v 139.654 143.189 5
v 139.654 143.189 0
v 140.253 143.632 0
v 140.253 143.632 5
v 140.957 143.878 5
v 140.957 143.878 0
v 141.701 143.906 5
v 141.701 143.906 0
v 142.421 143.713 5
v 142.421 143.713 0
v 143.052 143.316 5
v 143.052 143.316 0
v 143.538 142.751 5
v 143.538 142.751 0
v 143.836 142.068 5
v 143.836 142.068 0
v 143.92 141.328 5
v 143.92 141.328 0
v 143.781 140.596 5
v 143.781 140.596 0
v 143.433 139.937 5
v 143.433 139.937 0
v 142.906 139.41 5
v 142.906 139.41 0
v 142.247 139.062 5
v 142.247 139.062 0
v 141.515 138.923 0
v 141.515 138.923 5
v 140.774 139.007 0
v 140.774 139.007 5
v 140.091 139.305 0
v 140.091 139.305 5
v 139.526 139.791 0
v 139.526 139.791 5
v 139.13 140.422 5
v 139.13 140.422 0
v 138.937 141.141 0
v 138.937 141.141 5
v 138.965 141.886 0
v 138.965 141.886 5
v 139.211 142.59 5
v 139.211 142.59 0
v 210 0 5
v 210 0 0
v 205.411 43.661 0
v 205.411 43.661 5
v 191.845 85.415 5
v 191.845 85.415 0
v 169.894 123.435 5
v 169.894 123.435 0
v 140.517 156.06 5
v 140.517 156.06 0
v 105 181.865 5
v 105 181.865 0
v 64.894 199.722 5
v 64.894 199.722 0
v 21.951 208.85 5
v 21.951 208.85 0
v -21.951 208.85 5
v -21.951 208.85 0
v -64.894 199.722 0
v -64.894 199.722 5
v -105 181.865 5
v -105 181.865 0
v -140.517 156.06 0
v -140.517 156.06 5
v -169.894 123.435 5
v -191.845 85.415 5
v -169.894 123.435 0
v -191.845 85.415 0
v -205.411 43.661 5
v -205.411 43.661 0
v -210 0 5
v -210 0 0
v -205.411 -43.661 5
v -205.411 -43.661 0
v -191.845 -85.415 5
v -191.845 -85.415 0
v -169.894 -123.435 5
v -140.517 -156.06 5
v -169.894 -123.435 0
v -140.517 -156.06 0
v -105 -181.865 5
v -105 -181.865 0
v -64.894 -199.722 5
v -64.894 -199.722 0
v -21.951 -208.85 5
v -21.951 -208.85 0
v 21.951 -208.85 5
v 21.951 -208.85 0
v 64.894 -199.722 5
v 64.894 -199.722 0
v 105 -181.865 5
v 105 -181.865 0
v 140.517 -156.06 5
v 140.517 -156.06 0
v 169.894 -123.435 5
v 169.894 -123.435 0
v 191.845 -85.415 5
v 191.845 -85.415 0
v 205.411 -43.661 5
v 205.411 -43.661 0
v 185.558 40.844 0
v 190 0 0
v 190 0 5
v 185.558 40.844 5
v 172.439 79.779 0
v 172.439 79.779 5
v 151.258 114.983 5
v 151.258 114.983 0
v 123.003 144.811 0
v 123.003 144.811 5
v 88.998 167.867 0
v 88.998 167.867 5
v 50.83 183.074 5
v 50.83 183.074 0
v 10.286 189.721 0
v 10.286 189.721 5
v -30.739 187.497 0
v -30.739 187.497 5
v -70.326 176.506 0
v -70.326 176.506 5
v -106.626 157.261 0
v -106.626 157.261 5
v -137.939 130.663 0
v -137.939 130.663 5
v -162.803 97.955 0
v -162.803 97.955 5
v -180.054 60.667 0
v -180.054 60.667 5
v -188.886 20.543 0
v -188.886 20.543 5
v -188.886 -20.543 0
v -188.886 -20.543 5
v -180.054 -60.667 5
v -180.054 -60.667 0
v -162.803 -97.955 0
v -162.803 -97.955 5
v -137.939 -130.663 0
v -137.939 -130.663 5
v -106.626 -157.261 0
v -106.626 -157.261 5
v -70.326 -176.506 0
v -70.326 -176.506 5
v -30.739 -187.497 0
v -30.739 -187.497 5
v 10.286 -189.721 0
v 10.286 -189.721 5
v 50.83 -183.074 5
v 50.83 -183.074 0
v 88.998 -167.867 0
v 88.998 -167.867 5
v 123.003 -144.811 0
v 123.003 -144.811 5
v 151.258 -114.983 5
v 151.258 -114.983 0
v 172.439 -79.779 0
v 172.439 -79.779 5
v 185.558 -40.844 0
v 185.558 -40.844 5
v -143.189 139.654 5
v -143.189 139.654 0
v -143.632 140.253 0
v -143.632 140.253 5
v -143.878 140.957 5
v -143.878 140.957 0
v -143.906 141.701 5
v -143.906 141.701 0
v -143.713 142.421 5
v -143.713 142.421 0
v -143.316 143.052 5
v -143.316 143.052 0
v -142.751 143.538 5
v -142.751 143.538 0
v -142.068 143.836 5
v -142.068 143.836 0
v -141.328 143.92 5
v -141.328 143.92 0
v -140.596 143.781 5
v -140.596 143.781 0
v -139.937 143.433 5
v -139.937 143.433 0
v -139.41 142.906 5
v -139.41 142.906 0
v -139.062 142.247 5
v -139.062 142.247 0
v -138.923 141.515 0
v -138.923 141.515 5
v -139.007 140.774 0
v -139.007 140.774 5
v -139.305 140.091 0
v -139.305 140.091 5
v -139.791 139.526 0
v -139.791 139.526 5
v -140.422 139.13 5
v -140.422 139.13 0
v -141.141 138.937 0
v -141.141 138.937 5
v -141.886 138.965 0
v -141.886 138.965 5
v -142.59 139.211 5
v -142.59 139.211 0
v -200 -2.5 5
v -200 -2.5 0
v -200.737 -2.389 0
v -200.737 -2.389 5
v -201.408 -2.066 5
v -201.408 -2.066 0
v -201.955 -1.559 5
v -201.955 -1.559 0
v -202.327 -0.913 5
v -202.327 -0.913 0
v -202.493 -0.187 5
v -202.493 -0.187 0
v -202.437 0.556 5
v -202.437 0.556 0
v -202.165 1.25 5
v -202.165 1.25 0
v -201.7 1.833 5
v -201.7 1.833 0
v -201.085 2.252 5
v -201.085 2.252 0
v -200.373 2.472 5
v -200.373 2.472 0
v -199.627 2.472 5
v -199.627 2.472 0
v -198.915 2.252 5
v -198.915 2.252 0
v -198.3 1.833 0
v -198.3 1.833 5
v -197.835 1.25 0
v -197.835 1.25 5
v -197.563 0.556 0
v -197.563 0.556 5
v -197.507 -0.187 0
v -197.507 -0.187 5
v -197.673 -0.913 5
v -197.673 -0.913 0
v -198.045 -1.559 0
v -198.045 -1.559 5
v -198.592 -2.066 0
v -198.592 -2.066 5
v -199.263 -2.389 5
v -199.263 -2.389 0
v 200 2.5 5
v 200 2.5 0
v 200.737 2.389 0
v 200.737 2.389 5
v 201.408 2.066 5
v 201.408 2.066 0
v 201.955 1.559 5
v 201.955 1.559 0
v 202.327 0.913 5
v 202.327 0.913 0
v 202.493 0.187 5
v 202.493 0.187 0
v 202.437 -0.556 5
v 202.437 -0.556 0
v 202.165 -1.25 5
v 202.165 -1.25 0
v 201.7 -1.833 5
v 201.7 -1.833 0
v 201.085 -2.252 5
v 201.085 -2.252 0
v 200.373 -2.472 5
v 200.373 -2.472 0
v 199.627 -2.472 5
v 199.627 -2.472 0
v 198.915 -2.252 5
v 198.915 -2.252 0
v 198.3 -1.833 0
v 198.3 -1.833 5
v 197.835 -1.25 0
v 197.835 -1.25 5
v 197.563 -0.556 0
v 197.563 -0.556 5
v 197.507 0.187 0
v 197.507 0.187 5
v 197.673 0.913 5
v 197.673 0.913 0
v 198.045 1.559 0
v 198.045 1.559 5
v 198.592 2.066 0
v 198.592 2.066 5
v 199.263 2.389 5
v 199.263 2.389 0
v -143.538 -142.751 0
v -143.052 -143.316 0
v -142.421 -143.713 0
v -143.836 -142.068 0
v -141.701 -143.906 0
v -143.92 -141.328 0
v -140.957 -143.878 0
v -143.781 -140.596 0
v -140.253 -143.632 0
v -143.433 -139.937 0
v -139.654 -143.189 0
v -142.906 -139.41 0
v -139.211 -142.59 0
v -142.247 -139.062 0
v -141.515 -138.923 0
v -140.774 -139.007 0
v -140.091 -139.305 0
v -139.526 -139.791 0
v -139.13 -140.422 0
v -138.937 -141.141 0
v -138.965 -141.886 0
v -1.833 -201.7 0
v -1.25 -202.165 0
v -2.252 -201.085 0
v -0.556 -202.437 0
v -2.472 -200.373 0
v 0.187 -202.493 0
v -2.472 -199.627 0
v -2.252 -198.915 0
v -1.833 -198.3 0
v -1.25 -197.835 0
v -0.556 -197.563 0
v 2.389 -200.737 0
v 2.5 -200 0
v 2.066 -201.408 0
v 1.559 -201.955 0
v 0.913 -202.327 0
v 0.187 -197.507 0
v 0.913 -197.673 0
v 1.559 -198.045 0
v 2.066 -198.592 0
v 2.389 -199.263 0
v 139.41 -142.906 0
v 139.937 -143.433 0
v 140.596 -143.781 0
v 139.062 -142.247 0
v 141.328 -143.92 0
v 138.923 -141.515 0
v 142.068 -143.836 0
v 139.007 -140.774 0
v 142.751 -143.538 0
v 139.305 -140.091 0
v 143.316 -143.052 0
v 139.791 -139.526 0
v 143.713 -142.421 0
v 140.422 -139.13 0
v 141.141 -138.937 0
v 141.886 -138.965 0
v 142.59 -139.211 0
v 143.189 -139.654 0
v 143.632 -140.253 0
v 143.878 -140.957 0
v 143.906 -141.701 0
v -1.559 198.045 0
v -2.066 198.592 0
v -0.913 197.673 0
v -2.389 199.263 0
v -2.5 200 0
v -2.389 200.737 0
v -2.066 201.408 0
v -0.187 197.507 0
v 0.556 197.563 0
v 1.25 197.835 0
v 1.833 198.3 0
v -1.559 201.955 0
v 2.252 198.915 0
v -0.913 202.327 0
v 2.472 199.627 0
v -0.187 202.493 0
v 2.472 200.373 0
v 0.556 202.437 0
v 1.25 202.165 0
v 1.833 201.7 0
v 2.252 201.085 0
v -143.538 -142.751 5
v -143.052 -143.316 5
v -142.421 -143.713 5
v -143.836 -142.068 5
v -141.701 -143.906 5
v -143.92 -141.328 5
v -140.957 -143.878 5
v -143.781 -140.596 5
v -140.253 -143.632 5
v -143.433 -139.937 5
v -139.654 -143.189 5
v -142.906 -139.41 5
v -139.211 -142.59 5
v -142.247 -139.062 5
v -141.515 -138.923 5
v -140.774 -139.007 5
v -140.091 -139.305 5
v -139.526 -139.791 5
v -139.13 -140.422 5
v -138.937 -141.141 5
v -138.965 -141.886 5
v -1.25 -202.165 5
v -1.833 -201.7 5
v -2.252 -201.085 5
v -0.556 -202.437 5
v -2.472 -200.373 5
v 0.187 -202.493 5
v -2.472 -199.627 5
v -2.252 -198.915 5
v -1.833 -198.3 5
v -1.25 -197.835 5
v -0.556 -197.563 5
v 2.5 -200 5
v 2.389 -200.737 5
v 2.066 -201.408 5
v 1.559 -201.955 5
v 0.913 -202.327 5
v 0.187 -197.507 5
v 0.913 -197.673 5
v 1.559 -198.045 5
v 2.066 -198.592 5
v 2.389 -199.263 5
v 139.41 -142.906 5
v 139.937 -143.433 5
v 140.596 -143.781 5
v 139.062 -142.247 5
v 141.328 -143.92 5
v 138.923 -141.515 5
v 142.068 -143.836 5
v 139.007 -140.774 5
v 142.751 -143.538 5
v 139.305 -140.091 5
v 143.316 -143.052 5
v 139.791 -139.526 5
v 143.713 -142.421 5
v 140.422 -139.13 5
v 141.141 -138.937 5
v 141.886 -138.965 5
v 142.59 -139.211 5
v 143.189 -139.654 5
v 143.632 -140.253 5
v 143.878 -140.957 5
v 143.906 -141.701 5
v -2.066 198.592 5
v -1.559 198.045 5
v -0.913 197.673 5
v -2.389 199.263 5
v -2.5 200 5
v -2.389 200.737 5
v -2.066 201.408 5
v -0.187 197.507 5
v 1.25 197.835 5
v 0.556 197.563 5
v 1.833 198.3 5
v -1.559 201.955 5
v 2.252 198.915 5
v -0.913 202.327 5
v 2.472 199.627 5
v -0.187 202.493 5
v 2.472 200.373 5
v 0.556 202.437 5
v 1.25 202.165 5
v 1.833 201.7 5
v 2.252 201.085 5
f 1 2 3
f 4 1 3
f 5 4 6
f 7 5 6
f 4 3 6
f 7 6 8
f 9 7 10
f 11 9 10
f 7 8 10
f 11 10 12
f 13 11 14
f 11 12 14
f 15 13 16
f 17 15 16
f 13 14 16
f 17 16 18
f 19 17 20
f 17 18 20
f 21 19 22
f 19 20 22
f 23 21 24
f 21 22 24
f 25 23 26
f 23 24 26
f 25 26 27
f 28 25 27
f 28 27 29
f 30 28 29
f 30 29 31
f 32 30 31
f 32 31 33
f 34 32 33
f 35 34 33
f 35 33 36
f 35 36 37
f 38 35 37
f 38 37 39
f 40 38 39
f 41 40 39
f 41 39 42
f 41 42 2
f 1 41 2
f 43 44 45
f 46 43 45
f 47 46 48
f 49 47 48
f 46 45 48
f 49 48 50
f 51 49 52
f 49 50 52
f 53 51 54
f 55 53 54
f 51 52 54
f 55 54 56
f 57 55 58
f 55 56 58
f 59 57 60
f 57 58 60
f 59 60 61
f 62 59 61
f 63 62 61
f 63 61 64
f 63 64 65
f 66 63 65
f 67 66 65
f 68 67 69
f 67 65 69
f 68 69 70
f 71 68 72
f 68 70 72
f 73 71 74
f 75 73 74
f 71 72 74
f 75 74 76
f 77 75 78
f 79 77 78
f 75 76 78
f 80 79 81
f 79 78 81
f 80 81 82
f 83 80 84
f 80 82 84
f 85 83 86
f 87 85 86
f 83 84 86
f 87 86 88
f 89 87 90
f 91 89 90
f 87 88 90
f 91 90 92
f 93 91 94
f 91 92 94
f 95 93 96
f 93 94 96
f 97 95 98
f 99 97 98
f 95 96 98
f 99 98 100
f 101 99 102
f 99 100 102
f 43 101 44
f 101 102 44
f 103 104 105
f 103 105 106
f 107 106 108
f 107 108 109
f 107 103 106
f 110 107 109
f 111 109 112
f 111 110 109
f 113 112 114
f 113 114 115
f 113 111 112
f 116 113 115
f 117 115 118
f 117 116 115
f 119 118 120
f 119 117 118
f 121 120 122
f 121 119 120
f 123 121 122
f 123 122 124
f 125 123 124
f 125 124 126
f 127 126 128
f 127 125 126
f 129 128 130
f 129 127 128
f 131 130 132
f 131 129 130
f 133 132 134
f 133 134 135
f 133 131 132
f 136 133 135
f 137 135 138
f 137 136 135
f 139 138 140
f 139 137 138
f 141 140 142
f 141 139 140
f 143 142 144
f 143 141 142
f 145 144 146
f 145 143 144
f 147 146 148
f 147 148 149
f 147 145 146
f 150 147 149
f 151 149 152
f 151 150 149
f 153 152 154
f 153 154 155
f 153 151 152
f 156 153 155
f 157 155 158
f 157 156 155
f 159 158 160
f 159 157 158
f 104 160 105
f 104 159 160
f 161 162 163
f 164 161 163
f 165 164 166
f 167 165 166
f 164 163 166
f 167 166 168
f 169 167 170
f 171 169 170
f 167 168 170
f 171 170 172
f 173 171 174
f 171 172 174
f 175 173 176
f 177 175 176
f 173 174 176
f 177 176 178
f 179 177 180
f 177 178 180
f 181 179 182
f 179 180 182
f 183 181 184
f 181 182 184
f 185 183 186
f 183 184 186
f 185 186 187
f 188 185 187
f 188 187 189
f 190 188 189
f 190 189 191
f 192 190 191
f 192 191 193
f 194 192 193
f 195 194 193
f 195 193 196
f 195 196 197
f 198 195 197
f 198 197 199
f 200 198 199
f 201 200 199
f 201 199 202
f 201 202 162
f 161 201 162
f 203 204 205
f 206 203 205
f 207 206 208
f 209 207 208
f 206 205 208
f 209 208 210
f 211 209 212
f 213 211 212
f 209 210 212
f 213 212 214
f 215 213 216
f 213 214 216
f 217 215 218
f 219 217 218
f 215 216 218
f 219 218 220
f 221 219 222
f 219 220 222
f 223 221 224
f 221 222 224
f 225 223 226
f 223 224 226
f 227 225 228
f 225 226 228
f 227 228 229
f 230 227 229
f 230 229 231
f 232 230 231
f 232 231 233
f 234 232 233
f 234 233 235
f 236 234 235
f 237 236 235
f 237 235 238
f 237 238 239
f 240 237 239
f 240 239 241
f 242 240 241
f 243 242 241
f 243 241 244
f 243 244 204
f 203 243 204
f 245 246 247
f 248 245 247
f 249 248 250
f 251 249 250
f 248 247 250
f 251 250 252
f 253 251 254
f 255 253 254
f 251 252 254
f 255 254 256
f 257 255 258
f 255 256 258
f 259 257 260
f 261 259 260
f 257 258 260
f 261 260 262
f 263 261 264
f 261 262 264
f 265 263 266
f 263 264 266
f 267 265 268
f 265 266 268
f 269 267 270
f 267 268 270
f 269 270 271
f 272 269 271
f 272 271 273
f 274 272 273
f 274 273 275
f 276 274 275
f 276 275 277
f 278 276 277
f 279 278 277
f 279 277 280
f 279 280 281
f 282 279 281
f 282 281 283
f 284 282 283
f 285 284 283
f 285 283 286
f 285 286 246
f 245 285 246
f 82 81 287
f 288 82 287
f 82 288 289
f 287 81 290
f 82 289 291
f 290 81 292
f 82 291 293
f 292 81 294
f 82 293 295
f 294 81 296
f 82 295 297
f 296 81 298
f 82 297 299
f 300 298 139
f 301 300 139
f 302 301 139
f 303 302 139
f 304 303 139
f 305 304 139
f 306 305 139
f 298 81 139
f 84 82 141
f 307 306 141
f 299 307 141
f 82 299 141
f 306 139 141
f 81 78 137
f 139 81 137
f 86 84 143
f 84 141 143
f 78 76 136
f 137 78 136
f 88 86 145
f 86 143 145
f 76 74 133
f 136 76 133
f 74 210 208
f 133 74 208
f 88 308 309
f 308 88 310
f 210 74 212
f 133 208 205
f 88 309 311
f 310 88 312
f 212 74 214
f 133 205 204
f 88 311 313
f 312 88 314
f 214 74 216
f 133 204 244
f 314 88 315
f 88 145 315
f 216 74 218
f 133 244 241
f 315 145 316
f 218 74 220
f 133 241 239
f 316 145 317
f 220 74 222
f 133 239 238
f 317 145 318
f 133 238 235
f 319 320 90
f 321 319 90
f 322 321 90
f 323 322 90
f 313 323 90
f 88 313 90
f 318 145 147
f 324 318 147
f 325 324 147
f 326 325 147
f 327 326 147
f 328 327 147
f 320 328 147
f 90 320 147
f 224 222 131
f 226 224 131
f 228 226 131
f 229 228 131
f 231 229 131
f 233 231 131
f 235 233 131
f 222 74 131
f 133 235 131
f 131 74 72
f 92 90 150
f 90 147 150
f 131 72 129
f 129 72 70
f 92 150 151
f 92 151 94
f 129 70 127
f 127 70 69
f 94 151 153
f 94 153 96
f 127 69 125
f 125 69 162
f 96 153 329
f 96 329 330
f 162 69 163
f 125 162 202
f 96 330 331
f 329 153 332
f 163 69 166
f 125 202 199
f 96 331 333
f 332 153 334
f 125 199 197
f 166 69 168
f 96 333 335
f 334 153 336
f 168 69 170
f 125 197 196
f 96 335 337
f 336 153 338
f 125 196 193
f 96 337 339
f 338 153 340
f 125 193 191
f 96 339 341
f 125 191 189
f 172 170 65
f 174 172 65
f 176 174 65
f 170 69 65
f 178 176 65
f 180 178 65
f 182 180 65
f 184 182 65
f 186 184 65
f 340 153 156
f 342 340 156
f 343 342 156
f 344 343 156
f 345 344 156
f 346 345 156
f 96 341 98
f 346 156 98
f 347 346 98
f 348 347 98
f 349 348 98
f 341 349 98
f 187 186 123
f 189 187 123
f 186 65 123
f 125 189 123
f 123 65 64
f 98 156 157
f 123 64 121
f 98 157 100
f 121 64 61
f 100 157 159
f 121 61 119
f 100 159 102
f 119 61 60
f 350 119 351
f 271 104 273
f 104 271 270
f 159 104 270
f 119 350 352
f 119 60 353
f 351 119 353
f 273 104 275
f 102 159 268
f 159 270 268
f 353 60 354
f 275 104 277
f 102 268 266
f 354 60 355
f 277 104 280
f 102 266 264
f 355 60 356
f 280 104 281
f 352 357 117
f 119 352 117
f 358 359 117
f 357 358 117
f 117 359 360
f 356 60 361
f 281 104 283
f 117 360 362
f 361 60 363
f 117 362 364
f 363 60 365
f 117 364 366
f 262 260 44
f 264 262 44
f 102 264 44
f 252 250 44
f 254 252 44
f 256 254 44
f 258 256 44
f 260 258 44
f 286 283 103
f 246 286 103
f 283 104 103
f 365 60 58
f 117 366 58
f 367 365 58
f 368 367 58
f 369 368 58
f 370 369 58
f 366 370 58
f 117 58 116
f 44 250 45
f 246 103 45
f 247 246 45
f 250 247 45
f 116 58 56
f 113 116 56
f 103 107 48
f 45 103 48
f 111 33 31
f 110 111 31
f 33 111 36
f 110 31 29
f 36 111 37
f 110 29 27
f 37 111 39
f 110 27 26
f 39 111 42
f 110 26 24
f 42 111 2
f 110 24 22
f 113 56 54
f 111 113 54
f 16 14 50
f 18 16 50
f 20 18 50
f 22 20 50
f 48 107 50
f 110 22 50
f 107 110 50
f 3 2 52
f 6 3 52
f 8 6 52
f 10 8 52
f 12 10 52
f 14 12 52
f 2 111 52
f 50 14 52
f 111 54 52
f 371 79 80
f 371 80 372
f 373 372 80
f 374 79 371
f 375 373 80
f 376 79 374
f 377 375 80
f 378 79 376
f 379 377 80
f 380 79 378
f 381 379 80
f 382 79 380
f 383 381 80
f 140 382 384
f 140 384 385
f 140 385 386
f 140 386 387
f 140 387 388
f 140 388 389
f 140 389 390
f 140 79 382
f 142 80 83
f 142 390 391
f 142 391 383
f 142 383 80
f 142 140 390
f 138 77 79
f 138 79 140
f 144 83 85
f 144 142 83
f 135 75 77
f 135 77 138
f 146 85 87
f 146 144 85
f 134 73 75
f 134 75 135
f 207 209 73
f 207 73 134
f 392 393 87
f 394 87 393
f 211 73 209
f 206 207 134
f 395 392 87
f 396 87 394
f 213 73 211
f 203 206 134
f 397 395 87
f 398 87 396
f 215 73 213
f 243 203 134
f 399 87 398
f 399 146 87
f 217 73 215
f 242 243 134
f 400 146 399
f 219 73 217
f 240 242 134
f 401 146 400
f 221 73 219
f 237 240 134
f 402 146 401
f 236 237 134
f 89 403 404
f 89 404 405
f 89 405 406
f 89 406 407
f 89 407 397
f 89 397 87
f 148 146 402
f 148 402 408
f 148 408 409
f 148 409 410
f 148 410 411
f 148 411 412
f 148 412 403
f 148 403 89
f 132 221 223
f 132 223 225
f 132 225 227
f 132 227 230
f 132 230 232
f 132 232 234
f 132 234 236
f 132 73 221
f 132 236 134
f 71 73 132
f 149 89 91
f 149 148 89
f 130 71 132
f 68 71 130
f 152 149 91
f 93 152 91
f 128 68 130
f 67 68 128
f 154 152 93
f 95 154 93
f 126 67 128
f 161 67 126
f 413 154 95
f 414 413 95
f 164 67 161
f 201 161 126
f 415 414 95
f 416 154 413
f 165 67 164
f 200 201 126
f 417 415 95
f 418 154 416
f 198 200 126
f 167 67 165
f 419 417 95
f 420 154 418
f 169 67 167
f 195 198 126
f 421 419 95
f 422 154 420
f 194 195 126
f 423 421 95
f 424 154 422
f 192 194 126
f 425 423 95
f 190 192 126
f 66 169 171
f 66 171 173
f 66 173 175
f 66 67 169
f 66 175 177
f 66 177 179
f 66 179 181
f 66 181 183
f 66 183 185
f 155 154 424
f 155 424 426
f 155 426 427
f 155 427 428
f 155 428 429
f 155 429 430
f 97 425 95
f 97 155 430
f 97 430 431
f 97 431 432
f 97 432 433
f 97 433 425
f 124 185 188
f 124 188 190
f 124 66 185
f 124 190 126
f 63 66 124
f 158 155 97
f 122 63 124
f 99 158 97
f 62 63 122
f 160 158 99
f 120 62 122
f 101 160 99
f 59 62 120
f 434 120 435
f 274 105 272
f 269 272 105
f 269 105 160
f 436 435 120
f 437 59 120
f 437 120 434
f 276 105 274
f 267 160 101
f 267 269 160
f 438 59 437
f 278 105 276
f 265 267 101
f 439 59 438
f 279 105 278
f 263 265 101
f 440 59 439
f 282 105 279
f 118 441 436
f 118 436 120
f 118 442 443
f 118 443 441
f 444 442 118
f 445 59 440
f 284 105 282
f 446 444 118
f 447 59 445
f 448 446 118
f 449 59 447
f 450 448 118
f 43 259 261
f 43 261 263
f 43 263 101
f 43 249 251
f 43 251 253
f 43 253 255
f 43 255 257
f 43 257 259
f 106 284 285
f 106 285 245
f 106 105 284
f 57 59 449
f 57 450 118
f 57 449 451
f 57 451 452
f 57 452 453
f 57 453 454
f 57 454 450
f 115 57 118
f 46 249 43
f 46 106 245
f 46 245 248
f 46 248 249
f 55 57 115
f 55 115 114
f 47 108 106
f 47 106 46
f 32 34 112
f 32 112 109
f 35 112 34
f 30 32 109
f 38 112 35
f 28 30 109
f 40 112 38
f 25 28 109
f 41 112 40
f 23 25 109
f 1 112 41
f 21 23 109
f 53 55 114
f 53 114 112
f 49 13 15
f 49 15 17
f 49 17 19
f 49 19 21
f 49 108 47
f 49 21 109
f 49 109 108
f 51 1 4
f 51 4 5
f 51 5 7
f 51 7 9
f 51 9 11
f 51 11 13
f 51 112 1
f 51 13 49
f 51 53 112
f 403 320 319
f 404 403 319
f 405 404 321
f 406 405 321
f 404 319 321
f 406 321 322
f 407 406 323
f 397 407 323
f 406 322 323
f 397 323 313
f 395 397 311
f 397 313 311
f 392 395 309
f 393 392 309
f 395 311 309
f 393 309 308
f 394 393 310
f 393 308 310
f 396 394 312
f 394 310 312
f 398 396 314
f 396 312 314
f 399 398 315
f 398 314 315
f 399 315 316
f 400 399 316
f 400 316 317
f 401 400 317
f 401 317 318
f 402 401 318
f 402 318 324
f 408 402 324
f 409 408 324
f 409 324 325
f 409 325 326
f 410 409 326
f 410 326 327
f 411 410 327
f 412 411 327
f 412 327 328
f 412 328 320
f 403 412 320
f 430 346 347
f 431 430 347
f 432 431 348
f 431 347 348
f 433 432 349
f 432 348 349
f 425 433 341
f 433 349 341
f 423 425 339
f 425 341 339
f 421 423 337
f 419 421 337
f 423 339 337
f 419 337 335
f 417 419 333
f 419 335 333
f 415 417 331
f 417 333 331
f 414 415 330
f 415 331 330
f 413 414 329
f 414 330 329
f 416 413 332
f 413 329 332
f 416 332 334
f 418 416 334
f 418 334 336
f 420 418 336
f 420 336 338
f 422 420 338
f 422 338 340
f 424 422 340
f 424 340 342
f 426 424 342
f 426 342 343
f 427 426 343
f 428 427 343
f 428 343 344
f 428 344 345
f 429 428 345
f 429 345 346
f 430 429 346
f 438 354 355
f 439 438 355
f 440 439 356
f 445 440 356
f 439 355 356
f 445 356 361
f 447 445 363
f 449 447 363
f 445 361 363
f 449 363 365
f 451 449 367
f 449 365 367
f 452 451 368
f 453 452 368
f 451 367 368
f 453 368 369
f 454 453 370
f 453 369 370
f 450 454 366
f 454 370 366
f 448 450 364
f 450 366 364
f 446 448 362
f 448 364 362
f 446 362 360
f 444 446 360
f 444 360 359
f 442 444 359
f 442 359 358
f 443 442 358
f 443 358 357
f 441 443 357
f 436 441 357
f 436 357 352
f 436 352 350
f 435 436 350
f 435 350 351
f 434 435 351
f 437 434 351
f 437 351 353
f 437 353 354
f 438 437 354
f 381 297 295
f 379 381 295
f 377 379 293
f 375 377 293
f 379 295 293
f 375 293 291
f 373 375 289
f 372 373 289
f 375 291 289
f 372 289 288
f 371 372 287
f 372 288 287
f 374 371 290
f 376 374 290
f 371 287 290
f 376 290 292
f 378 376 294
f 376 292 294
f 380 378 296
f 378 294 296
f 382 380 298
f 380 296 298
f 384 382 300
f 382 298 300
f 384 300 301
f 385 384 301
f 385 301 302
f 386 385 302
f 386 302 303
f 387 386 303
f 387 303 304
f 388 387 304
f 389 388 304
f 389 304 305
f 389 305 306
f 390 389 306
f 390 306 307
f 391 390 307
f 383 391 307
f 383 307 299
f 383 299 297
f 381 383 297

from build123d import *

# Parameters (mm, degrees)
SKETCH1_R           = 210
SKETCH1_R_2         = 190
BOSS_EXTRUDE1_DEPTH = 5
M6_TAPPED_HOLE1_D   = 5
CIRPATTERN1_COUNT   = 8


with BuildPart() as part:
    # Sketch1 → Boss-Extrude1 (new body)
    with BuildSketch(Plane.XY):
        Circle(SKETCH1_R)
        Circle(SKETCH1_R_2, mode=Mode.SUBTRACT)
    extrude(amount=BOSS_EXTRUDE1_DEPTH)

    # M6 Tapped Hole1 (through all)
    with Locations(Plane.XY.offset(5)):
        with Locations((0, 200)):
            m6_tapped_hole1 = Hole(M6_TAPPED_HOLE1_D / 2)

    # CirPattern1: M6 Tapped Hole1 ×8 about axis
    cirpattern1_axis = Axis((0, 0, 0), (0, 0, 1))
    for i in range(1, CIRPATTERN1_COUNT):
        add(m6_tapped_hole1.rotate(cirpattern1_axis, i * 360 / CIRPATTERN1_COUNT), mode=Mode.SUBTRACT)


solid = part.part
